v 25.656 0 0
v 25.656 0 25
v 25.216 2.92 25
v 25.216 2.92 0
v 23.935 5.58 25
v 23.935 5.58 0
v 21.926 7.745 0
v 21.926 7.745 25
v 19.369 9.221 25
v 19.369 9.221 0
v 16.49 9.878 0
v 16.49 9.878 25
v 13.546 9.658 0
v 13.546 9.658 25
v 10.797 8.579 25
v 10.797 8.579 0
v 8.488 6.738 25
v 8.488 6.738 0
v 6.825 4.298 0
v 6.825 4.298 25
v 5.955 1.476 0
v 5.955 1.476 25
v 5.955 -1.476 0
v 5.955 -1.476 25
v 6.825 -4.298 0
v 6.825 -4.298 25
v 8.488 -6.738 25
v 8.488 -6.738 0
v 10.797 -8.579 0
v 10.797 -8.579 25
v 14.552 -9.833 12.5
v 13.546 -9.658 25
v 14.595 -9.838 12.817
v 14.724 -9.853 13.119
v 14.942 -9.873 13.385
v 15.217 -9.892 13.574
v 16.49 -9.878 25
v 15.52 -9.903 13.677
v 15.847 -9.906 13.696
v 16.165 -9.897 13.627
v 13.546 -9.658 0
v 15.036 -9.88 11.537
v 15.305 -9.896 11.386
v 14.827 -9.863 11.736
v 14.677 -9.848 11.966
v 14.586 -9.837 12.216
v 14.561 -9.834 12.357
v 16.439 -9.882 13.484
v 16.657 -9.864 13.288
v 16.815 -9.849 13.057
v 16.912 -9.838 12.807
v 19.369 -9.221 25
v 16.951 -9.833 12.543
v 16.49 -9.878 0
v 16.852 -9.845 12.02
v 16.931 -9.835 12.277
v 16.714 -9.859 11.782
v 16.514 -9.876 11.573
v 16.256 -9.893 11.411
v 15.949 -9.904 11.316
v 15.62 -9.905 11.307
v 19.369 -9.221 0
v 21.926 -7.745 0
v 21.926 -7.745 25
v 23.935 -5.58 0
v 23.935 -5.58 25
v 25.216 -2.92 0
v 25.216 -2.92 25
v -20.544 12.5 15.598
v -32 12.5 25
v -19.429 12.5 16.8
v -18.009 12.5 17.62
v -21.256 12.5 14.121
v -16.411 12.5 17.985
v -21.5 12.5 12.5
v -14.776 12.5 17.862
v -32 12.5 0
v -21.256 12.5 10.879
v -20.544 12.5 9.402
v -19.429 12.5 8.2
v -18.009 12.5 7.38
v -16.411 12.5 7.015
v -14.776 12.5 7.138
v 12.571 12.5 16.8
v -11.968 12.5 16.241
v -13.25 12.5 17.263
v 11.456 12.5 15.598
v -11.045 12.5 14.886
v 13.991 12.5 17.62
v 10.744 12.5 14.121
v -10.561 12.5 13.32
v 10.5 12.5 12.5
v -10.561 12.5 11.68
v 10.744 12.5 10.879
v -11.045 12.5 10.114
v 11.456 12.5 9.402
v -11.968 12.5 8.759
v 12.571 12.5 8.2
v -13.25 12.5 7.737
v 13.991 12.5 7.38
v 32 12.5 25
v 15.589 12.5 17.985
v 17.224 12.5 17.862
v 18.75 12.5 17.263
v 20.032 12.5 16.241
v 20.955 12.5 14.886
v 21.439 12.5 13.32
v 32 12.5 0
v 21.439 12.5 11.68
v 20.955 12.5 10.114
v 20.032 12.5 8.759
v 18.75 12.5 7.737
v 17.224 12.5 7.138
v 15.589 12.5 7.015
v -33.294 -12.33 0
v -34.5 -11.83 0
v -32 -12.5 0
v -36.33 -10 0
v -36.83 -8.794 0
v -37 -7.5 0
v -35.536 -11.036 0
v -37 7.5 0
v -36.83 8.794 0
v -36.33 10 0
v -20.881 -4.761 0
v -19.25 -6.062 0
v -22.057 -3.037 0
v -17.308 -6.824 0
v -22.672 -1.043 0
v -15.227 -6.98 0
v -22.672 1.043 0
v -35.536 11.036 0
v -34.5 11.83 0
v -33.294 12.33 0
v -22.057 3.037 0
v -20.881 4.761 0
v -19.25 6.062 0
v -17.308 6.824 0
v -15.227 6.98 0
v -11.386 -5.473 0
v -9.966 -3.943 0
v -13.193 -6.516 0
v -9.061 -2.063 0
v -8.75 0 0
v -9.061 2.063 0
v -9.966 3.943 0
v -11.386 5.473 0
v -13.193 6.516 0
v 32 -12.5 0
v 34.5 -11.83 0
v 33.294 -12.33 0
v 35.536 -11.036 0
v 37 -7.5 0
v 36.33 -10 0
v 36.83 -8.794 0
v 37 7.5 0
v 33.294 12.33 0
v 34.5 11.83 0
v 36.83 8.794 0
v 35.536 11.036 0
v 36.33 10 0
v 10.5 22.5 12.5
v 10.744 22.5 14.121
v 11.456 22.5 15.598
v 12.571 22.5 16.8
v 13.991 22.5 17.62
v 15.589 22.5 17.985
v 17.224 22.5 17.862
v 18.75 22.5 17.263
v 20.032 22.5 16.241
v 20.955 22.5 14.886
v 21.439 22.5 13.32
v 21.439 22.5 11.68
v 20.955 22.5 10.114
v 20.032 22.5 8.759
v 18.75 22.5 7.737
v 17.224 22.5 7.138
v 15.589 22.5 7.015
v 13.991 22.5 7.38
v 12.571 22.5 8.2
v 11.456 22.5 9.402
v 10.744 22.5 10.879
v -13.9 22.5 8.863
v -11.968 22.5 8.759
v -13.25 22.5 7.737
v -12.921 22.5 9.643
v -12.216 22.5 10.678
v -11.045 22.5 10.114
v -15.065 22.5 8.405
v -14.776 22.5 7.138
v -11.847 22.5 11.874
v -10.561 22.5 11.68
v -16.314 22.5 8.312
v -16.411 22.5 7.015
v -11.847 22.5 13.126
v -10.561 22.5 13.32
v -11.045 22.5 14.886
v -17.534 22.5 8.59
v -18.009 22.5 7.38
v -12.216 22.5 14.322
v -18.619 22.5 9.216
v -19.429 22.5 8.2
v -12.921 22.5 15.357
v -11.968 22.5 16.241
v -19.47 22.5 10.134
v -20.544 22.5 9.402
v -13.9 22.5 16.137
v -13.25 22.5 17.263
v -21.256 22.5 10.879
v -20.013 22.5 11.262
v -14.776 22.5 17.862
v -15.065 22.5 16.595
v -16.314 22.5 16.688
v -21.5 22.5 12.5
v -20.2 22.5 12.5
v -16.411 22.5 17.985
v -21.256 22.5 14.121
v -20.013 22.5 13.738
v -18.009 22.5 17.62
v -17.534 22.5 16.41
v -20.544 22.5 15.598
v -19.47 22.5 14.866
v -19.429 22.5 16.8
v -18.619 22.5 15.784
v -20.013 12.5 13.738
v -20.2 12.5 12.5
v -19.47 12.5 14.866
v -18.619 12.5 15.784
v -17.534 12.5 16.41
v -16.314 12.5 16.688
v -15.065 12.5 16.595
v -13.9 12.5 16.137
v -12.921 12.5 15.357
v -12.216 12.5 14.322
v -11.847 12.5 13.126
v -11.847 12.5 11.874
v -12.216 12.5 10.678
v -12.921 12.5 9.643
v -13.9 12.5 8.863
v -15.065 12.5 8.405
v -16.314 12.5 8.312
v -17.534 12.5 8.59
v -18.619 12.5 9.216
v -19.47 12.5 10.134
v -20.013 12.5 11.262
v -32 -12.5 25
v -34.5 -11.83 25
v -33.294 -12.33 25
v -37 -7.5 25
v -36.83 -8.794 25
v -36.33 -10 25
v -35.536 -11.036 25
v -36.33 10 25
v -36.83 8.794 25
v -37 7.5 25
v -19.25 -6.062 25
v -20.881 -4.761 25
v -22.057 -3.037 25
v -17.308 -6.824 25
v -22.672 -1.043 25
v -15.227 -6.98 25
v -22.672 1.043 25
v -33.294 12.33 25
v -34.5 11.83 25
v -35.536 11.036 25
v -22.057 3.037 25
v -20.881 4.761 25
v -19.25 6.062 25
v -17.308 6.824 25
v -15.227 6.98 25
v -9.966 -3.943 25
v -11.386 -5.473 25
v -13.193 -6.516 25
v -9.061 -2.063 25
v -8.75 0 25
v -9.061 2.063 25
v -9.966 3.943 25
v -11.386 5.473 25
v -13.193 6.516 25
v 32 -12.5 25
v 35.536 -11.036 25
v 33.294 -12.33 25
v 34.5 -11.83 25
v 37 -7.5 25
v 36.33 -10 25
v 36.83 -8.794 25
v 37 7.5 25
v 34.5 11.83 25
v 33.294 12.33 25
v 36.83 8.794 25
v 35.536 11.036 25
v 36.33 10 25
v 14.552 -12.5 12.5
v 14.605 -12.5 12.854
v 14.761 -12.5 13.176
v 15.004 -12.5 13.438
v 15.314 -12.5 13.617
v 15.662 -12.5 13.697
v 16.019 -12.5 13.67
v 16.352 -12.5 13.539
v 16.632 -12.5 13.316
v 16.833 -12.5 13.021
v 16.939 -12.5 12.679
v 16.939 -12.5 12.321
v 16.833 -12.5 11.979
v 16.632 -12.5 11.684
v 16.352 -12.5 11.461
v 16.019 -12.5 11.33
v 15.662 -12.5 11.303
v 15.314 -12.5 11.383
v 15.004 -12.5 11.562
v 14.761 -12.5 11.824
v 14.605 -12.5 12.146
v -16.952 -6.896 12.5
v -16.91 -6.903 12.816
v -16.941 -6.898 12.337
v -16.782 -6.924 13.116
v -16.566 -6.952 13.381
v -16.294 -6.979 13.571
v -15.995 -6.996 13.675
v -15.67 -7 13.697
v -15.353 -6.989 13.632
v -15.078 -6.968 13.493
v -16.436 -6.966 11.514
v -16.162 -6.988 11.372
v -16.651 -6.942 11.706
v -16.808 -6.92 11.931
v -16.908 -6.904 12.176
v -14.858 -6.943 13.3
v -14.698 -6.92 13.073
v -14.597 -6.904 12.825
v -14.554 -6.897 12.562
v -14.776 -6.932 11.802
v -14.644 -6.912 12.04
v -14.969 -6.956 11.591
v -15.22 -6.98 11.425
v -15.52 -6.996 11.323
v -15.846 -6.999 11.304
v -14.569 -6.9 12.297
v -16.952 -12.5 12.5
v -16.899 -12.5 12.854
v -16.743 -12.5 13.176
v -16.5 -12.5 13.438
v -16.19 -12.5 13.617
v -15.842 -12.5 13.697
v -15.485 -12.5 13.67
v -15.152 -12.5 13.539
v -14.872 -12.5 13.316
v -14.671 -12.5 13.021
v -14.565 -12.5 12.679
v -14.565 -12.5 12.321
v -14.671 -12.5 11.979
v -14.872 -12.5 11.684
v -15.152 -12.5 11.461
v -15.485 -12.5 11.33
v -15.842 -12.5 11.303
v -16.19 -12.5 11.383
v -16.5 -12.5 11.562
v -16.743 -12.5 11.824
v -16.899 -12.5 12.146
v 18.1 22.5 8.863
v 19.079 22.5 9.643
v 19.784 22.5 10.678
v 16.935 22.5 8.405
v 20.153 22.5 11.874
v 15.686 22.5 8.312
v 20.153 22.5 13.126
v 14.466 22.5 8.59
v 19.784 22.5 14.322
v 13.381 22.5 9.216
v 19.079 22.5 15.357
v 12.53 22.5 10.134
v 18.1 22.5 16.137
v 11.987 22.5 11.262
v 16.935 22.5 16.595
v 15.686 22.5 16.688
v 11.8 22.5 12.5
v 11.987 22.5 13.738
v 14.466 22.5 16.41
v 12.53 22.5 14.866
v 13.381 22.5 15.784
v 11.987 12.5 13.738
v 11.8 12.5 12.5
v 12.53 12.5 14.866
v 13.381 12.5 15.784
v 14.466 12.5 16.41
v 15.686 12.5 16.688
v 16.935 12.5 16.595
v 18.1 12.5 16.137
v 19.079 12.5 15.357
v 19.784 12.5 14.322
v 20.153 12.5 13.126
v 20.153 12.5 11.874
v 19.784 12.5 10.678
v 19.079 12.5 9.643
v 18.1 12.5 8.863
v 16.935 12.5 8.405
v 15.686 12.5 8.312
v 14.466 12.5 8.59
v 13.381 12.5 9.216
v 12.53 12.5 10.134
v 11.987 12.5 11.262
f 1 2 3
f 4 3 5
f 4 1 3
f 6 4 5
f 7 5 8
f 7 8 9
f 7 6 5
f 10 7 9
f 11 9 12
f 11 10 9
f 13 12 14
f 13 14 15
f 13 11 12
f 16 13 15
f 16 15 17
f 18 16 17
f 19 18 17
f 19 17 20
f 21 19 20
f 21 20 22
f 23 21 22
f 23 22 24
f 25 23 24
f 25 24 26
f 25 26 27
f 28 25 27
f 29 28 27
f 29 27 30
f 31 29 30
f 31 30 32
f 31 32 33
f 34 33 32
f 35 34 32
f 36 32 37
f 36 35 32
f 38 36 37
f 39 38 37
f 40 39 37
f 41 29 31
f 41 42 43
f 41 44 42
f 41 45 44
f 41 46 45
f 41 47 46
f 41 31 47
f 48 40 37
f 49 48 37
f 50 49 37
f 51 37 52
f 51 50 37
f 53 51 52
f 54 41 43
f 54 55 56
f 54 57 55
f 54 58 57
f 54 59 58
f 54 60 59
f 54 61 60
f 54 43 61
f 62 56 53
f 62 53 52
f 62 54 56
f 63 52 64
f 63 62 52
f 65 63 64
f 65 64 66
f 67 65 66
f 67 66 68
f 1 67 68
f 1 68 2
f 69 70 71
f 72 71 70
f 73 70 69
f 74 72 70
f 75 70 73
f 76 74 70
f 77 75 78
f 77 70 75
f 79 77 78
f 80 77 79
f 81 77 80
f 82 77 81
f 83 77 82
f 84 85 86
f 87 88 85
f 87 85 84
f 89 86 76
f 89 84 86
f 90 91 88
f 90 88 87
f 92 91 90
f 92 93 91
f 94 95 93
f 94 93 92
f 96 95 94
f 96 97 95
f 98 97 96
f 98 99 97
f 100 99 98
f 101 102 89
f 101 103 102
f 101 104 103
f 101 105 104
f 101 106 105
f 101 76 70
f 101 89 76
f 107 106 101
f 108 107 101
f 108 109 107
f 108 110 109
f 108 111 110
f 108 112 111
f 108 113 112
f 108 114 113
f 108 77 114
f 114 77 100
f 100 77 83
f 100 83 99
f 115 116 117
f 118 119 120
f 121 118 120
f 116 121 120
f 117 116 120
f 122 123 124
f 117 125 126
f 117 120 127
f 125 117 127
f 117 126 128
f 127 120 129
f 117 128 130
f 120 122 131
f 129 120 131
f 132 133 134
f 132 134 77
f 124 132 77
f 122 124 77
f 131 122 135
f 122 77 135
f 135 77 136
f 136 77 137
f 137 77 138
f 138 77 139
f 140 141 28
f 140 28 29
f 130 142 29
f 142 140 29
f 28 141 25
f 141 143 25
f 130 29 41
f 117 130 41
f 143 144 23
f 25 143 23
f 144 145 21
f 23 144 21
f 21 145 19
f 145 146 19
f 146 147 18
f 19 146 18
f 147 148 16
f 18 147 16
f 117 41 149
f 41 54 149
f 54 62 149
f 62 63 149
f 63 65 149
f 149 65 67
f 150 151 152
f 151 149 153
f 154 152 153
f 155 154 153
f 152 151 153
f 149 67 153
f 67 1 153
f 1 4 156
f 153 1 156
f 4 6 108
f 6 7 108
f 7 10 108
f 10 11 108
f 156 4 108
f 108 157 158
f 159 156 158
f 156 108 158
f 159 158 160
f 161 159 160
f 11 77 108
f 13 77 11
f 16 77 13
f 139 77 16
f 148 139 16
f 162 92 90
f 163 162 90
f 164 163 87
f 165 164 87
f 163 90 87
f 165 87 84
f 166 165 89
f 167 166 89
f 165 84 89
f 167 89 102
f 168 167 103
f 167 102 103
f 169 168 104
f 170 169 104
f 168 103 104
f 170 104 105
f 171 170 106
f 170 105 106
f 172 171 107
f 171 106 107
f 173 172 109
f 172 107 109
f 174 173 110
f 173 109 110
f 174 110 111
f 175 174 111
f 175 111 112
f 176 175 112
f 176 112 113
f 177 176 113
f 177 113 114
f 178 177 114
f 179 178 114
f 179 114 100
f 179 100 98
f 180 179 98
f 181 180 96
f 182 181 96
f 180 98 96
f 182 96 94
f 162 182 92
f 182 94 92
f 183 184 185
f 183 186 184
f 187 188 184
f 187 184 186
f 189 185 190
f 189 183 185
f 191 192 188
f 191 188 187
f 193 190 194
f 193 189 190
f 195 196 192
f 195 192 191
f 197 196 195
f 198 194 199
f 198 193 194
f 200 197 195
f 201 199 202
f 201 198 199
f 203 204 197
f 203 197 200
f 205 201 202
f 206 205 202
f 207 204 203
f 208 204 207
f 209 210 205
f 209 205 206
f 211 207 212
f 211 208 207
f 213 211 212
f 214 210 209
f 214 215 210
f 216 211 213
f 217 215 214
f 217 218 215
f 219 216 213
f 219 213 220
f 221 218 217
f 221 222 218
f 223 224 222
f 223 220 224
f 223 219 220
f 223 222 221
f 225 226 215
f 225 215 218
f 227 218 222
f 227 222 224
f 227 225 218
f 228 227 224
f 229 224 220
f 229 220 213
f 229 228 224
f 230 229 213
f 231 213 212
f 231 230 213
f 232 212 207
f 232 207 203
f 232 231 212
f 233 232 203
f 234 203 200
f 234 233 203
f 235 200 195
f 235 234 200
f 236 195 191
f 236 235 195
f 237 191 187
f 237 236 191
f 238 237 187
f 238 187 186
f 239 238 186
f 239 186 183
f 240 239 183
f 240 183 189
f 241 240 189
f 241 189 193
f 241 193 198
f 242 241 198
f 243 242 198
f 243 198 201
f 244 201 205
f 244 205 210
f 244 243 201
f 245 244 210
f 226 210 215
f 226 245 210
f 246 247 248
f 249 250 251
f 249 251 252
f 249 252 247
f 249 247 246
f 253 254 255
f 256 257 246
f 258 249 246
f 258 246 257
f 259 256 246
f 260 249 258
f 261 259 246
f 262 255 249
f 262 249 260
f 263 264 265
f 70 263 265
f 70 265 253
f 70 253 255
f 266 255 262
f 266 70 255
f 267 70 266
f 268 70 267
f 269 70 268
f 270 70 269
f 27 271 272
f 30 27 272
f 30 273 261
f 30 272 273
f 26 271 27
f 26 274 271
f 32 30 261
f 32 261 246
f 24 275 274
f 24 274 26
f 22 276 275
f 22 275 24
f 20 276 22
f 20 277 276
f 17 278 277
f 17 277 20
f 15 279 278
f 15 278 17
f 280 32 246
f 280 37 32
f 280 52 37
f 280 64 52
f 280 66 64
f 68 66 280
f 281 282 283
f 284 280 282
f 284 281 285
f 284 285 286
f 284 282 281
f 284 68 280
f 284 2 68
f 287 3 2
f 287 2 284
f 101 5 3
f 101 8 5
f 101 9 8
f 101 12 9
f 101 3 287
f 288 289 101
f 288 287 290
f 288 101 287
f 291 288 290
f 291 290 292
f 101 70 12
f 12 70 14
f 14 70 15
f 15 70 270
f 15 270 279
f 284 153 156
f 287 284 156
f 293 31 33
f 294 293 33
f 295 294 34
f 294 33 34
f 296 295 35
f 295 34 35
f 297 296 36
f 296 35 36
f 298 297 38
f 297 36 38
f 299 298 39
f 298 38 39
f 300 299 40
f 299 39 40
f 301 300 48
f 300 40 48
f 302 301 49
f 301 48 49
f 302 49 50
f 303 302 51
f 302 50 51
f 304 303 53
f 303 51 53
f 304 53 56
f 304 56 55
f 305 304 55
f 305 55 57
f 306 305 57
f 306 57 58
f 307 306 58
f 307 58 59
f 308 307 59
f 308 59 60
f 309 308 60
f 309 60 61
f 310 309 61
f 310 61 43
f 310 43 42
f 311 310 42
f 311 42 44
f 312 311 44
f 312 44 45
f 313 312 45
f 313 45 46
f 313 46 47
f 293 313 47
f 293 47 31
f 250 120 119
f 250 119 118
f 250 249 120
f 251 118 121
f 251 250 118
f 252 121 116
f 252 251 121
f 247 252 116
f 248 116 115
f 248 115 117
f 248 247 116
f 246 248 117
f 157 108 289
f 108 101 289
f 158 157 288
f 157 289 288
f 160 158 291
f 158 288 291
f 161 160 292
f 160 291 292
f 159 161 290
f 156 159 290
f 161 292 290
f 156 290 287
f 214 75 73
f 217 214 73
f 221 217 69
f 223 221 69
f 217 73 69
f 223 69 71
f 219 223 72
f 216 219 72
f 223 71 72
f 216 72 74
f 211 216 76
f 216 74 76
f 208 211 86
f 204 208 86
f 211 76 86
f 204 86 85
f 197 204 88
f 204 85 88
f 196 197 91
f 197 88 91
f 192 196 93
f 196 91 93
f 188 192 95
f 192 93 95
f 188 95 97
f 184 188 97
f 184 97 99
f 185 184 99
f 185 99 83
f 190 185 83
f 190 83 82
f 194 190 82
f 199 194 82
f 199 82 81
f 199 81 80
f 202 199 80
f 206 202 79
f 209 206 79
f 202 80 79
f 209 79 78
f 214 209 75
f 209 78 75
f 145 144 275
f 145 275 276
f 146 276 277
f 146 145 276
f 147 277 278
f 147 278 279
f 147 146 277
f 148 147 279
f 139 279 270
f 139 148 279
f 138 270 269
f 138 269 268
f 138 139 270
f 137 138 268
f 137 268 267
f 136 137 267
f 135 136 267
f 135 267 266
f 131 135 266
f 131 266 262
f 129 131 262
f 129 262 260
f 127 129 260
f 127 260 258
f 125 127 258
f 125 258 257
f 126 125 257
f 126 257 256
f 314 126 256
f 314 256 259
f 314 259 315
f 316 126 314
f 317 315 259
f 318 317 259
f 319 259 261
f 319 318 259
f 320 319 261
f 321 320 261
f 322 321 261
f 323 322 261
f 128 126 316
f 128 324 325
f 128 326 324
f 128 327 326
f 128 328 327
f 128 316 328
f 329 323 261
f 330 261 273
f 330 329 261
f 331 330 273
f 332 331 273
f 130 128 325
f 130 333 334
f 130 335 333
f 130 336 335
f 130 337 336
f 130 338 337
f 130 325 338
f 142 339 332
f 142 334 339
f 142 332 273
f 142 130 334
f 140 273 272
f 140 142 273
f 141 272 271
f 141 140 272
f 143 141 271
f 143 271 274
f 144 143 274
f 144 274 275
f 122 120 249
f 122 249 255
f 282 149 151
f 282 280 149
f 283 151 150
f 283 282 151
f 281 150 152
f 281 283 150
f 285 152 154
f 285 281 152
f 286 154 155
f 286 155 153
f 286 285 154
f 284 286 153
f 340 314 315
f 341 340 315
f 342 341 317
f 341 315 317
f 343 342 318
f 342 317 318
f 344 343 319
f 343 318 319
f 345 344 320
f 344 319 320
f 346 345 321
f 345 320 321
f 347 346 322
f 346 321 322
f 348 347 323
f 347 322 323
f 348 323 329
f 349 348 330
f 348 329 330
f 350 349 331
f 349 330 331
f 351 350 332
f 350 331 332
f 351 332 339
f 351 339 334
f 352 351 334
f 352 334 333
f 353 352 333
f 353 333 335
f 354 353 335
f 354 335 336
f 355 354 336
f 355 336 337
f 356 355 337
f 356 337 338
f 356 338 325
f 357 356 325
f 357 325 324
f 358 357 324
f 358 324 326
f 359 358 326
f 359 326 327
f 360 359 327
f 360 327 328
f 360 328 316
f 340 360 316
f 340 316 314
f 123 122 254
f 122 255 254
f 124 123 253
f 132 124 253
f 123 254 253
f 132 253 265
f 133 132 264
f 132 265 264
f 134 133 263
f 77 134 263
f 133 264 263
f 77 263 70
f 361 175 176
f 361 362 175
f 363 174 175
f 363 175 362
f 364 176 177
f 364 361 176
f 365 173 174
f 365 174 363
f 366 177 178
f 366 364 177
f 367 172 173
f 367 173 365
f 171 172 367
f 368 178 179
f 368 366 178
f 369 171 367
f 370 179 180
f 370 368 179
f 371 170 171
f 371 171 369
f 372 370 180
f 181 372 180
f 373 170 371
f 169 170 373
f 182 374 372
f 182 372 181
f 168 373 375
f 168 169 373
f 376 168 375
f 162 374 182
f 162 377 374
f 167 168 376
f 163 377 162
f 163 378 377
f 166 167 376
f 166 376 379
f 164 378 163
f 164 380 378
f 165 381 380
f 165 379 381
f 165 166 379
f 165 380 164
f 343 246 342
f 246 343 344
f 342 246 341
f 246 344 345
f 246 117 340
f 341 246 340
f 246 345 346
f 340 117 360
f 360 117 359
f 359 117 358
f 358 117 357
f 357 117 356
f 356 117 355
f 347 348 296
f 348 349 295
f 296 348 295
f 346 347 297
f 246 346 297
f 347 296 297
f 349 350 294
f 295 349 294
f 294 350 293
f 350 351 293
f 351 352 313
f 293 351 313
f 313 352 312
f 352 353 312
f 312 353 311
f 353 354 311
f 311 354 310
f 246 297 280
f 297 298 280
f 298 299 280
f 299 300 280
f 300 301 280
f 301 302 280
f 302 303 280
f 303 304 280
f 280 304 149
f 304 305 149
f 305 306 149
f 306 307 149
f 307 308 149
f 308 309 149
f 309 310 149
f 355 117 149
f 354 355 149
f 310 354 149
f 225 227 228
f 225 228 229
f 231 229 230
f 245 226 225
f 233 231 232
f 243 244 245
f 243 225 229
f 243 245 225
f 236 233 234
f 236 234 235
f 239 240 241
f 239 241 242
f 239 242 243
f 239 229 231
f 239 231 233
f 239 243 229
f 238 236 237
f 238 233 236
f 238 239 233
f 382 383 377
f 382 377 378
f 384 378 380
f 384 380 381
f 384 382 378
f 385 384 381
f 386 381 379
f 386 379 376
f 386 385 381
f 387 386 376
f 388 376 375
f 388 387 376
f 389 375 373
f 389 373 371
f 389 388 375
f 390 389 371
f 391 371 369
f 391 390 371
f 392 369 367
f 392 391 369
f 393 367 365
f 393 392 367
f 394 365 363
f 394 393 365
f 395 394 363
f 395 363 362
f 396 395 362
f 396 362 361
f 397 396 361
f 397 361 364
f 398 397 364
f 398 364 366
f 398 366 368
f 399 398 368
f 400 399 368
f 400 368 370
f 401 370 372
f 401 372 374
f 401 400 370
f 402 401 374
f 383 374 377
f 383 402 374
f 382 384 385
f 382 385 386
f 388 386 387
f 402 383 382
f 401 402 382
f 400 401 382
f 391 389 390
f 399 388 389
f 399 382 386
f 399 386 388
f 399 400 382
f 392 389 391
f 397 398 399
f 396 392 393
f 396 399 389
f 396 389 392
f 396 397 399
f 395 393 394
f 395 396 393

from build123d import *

# Parameters (mm, degrees)
F0_W     = 74
F0_H     = 25
F0_R     = 7
F0_R_2   = 9.906
F1_DEPTH = 25
F3_D     = 2.4
F3_DEPTH = 10
F3_TIP   = 0.7210327428
F4_R     = 5
F5_R     = 5.5
F5_R_2   = 4.2
F6_DEPTH = 10


with BuildPart() as f1:
    # F0 (on Top) → F1 (new body)
    with BuildSketch(Plane.XY):
        Rectangle(F0_W, F0_H)
        with Locations((-15.75, 0)):
            Circle(F0_R, mode=Mode.SUBTRACT)
        with Locations((15.75, 0)):
            Circle(F0_R_2, mode=Mode.SUBTRACT)
    extrude(amount=F1_DEPTH)

    # F3
    with Locations(Plane.XZ.offset(12.5)):
        with Locations((15.752, 12.5), (-15.752, 12.5)):
            Hole(F3_D / 2, depth=F3_DEPTH)
            with Locations((0, 0, -(F3_DEPTH + F3_TIP / 2))):  # 118° drill point
                Cone(0, F3_D / 2, F3_TIP, mode=Mode.SUBTRACT)

    # F4
    f4_edges = [f1.edges().sort_by_distance(p)[0] for p in [
        (-37, -12.5, 12.5),
        (37, -12.5, 12.5),
        (37, 12.5, 12.5),
        (-37, 12.5, 12.5),
    ]]
    fillet(f4_edges, radius=F4_R)

    # F5 (on face) → F6 (join)
    with BuildSketch(Plane(origin=(0, 12.5, 0), x_dir=(-1, 0, 0), z_dir=(0, 1, 0))):
        with Locations((-16, 12.5)):
            Circle(F5_R)
        with Locations((-16, 12.5)):
            Circle(F5_R_2, mode=Mode.SUBTRACT)
        with Locations((16, 12.5)):
            Circle(F5_R)
        with Locations((16, 12.5)):
            Circle(F5_R_2, mode=Mode.SUBTRACT)
    extrude(amount=F6_DEPTH)


solid = f1.part
